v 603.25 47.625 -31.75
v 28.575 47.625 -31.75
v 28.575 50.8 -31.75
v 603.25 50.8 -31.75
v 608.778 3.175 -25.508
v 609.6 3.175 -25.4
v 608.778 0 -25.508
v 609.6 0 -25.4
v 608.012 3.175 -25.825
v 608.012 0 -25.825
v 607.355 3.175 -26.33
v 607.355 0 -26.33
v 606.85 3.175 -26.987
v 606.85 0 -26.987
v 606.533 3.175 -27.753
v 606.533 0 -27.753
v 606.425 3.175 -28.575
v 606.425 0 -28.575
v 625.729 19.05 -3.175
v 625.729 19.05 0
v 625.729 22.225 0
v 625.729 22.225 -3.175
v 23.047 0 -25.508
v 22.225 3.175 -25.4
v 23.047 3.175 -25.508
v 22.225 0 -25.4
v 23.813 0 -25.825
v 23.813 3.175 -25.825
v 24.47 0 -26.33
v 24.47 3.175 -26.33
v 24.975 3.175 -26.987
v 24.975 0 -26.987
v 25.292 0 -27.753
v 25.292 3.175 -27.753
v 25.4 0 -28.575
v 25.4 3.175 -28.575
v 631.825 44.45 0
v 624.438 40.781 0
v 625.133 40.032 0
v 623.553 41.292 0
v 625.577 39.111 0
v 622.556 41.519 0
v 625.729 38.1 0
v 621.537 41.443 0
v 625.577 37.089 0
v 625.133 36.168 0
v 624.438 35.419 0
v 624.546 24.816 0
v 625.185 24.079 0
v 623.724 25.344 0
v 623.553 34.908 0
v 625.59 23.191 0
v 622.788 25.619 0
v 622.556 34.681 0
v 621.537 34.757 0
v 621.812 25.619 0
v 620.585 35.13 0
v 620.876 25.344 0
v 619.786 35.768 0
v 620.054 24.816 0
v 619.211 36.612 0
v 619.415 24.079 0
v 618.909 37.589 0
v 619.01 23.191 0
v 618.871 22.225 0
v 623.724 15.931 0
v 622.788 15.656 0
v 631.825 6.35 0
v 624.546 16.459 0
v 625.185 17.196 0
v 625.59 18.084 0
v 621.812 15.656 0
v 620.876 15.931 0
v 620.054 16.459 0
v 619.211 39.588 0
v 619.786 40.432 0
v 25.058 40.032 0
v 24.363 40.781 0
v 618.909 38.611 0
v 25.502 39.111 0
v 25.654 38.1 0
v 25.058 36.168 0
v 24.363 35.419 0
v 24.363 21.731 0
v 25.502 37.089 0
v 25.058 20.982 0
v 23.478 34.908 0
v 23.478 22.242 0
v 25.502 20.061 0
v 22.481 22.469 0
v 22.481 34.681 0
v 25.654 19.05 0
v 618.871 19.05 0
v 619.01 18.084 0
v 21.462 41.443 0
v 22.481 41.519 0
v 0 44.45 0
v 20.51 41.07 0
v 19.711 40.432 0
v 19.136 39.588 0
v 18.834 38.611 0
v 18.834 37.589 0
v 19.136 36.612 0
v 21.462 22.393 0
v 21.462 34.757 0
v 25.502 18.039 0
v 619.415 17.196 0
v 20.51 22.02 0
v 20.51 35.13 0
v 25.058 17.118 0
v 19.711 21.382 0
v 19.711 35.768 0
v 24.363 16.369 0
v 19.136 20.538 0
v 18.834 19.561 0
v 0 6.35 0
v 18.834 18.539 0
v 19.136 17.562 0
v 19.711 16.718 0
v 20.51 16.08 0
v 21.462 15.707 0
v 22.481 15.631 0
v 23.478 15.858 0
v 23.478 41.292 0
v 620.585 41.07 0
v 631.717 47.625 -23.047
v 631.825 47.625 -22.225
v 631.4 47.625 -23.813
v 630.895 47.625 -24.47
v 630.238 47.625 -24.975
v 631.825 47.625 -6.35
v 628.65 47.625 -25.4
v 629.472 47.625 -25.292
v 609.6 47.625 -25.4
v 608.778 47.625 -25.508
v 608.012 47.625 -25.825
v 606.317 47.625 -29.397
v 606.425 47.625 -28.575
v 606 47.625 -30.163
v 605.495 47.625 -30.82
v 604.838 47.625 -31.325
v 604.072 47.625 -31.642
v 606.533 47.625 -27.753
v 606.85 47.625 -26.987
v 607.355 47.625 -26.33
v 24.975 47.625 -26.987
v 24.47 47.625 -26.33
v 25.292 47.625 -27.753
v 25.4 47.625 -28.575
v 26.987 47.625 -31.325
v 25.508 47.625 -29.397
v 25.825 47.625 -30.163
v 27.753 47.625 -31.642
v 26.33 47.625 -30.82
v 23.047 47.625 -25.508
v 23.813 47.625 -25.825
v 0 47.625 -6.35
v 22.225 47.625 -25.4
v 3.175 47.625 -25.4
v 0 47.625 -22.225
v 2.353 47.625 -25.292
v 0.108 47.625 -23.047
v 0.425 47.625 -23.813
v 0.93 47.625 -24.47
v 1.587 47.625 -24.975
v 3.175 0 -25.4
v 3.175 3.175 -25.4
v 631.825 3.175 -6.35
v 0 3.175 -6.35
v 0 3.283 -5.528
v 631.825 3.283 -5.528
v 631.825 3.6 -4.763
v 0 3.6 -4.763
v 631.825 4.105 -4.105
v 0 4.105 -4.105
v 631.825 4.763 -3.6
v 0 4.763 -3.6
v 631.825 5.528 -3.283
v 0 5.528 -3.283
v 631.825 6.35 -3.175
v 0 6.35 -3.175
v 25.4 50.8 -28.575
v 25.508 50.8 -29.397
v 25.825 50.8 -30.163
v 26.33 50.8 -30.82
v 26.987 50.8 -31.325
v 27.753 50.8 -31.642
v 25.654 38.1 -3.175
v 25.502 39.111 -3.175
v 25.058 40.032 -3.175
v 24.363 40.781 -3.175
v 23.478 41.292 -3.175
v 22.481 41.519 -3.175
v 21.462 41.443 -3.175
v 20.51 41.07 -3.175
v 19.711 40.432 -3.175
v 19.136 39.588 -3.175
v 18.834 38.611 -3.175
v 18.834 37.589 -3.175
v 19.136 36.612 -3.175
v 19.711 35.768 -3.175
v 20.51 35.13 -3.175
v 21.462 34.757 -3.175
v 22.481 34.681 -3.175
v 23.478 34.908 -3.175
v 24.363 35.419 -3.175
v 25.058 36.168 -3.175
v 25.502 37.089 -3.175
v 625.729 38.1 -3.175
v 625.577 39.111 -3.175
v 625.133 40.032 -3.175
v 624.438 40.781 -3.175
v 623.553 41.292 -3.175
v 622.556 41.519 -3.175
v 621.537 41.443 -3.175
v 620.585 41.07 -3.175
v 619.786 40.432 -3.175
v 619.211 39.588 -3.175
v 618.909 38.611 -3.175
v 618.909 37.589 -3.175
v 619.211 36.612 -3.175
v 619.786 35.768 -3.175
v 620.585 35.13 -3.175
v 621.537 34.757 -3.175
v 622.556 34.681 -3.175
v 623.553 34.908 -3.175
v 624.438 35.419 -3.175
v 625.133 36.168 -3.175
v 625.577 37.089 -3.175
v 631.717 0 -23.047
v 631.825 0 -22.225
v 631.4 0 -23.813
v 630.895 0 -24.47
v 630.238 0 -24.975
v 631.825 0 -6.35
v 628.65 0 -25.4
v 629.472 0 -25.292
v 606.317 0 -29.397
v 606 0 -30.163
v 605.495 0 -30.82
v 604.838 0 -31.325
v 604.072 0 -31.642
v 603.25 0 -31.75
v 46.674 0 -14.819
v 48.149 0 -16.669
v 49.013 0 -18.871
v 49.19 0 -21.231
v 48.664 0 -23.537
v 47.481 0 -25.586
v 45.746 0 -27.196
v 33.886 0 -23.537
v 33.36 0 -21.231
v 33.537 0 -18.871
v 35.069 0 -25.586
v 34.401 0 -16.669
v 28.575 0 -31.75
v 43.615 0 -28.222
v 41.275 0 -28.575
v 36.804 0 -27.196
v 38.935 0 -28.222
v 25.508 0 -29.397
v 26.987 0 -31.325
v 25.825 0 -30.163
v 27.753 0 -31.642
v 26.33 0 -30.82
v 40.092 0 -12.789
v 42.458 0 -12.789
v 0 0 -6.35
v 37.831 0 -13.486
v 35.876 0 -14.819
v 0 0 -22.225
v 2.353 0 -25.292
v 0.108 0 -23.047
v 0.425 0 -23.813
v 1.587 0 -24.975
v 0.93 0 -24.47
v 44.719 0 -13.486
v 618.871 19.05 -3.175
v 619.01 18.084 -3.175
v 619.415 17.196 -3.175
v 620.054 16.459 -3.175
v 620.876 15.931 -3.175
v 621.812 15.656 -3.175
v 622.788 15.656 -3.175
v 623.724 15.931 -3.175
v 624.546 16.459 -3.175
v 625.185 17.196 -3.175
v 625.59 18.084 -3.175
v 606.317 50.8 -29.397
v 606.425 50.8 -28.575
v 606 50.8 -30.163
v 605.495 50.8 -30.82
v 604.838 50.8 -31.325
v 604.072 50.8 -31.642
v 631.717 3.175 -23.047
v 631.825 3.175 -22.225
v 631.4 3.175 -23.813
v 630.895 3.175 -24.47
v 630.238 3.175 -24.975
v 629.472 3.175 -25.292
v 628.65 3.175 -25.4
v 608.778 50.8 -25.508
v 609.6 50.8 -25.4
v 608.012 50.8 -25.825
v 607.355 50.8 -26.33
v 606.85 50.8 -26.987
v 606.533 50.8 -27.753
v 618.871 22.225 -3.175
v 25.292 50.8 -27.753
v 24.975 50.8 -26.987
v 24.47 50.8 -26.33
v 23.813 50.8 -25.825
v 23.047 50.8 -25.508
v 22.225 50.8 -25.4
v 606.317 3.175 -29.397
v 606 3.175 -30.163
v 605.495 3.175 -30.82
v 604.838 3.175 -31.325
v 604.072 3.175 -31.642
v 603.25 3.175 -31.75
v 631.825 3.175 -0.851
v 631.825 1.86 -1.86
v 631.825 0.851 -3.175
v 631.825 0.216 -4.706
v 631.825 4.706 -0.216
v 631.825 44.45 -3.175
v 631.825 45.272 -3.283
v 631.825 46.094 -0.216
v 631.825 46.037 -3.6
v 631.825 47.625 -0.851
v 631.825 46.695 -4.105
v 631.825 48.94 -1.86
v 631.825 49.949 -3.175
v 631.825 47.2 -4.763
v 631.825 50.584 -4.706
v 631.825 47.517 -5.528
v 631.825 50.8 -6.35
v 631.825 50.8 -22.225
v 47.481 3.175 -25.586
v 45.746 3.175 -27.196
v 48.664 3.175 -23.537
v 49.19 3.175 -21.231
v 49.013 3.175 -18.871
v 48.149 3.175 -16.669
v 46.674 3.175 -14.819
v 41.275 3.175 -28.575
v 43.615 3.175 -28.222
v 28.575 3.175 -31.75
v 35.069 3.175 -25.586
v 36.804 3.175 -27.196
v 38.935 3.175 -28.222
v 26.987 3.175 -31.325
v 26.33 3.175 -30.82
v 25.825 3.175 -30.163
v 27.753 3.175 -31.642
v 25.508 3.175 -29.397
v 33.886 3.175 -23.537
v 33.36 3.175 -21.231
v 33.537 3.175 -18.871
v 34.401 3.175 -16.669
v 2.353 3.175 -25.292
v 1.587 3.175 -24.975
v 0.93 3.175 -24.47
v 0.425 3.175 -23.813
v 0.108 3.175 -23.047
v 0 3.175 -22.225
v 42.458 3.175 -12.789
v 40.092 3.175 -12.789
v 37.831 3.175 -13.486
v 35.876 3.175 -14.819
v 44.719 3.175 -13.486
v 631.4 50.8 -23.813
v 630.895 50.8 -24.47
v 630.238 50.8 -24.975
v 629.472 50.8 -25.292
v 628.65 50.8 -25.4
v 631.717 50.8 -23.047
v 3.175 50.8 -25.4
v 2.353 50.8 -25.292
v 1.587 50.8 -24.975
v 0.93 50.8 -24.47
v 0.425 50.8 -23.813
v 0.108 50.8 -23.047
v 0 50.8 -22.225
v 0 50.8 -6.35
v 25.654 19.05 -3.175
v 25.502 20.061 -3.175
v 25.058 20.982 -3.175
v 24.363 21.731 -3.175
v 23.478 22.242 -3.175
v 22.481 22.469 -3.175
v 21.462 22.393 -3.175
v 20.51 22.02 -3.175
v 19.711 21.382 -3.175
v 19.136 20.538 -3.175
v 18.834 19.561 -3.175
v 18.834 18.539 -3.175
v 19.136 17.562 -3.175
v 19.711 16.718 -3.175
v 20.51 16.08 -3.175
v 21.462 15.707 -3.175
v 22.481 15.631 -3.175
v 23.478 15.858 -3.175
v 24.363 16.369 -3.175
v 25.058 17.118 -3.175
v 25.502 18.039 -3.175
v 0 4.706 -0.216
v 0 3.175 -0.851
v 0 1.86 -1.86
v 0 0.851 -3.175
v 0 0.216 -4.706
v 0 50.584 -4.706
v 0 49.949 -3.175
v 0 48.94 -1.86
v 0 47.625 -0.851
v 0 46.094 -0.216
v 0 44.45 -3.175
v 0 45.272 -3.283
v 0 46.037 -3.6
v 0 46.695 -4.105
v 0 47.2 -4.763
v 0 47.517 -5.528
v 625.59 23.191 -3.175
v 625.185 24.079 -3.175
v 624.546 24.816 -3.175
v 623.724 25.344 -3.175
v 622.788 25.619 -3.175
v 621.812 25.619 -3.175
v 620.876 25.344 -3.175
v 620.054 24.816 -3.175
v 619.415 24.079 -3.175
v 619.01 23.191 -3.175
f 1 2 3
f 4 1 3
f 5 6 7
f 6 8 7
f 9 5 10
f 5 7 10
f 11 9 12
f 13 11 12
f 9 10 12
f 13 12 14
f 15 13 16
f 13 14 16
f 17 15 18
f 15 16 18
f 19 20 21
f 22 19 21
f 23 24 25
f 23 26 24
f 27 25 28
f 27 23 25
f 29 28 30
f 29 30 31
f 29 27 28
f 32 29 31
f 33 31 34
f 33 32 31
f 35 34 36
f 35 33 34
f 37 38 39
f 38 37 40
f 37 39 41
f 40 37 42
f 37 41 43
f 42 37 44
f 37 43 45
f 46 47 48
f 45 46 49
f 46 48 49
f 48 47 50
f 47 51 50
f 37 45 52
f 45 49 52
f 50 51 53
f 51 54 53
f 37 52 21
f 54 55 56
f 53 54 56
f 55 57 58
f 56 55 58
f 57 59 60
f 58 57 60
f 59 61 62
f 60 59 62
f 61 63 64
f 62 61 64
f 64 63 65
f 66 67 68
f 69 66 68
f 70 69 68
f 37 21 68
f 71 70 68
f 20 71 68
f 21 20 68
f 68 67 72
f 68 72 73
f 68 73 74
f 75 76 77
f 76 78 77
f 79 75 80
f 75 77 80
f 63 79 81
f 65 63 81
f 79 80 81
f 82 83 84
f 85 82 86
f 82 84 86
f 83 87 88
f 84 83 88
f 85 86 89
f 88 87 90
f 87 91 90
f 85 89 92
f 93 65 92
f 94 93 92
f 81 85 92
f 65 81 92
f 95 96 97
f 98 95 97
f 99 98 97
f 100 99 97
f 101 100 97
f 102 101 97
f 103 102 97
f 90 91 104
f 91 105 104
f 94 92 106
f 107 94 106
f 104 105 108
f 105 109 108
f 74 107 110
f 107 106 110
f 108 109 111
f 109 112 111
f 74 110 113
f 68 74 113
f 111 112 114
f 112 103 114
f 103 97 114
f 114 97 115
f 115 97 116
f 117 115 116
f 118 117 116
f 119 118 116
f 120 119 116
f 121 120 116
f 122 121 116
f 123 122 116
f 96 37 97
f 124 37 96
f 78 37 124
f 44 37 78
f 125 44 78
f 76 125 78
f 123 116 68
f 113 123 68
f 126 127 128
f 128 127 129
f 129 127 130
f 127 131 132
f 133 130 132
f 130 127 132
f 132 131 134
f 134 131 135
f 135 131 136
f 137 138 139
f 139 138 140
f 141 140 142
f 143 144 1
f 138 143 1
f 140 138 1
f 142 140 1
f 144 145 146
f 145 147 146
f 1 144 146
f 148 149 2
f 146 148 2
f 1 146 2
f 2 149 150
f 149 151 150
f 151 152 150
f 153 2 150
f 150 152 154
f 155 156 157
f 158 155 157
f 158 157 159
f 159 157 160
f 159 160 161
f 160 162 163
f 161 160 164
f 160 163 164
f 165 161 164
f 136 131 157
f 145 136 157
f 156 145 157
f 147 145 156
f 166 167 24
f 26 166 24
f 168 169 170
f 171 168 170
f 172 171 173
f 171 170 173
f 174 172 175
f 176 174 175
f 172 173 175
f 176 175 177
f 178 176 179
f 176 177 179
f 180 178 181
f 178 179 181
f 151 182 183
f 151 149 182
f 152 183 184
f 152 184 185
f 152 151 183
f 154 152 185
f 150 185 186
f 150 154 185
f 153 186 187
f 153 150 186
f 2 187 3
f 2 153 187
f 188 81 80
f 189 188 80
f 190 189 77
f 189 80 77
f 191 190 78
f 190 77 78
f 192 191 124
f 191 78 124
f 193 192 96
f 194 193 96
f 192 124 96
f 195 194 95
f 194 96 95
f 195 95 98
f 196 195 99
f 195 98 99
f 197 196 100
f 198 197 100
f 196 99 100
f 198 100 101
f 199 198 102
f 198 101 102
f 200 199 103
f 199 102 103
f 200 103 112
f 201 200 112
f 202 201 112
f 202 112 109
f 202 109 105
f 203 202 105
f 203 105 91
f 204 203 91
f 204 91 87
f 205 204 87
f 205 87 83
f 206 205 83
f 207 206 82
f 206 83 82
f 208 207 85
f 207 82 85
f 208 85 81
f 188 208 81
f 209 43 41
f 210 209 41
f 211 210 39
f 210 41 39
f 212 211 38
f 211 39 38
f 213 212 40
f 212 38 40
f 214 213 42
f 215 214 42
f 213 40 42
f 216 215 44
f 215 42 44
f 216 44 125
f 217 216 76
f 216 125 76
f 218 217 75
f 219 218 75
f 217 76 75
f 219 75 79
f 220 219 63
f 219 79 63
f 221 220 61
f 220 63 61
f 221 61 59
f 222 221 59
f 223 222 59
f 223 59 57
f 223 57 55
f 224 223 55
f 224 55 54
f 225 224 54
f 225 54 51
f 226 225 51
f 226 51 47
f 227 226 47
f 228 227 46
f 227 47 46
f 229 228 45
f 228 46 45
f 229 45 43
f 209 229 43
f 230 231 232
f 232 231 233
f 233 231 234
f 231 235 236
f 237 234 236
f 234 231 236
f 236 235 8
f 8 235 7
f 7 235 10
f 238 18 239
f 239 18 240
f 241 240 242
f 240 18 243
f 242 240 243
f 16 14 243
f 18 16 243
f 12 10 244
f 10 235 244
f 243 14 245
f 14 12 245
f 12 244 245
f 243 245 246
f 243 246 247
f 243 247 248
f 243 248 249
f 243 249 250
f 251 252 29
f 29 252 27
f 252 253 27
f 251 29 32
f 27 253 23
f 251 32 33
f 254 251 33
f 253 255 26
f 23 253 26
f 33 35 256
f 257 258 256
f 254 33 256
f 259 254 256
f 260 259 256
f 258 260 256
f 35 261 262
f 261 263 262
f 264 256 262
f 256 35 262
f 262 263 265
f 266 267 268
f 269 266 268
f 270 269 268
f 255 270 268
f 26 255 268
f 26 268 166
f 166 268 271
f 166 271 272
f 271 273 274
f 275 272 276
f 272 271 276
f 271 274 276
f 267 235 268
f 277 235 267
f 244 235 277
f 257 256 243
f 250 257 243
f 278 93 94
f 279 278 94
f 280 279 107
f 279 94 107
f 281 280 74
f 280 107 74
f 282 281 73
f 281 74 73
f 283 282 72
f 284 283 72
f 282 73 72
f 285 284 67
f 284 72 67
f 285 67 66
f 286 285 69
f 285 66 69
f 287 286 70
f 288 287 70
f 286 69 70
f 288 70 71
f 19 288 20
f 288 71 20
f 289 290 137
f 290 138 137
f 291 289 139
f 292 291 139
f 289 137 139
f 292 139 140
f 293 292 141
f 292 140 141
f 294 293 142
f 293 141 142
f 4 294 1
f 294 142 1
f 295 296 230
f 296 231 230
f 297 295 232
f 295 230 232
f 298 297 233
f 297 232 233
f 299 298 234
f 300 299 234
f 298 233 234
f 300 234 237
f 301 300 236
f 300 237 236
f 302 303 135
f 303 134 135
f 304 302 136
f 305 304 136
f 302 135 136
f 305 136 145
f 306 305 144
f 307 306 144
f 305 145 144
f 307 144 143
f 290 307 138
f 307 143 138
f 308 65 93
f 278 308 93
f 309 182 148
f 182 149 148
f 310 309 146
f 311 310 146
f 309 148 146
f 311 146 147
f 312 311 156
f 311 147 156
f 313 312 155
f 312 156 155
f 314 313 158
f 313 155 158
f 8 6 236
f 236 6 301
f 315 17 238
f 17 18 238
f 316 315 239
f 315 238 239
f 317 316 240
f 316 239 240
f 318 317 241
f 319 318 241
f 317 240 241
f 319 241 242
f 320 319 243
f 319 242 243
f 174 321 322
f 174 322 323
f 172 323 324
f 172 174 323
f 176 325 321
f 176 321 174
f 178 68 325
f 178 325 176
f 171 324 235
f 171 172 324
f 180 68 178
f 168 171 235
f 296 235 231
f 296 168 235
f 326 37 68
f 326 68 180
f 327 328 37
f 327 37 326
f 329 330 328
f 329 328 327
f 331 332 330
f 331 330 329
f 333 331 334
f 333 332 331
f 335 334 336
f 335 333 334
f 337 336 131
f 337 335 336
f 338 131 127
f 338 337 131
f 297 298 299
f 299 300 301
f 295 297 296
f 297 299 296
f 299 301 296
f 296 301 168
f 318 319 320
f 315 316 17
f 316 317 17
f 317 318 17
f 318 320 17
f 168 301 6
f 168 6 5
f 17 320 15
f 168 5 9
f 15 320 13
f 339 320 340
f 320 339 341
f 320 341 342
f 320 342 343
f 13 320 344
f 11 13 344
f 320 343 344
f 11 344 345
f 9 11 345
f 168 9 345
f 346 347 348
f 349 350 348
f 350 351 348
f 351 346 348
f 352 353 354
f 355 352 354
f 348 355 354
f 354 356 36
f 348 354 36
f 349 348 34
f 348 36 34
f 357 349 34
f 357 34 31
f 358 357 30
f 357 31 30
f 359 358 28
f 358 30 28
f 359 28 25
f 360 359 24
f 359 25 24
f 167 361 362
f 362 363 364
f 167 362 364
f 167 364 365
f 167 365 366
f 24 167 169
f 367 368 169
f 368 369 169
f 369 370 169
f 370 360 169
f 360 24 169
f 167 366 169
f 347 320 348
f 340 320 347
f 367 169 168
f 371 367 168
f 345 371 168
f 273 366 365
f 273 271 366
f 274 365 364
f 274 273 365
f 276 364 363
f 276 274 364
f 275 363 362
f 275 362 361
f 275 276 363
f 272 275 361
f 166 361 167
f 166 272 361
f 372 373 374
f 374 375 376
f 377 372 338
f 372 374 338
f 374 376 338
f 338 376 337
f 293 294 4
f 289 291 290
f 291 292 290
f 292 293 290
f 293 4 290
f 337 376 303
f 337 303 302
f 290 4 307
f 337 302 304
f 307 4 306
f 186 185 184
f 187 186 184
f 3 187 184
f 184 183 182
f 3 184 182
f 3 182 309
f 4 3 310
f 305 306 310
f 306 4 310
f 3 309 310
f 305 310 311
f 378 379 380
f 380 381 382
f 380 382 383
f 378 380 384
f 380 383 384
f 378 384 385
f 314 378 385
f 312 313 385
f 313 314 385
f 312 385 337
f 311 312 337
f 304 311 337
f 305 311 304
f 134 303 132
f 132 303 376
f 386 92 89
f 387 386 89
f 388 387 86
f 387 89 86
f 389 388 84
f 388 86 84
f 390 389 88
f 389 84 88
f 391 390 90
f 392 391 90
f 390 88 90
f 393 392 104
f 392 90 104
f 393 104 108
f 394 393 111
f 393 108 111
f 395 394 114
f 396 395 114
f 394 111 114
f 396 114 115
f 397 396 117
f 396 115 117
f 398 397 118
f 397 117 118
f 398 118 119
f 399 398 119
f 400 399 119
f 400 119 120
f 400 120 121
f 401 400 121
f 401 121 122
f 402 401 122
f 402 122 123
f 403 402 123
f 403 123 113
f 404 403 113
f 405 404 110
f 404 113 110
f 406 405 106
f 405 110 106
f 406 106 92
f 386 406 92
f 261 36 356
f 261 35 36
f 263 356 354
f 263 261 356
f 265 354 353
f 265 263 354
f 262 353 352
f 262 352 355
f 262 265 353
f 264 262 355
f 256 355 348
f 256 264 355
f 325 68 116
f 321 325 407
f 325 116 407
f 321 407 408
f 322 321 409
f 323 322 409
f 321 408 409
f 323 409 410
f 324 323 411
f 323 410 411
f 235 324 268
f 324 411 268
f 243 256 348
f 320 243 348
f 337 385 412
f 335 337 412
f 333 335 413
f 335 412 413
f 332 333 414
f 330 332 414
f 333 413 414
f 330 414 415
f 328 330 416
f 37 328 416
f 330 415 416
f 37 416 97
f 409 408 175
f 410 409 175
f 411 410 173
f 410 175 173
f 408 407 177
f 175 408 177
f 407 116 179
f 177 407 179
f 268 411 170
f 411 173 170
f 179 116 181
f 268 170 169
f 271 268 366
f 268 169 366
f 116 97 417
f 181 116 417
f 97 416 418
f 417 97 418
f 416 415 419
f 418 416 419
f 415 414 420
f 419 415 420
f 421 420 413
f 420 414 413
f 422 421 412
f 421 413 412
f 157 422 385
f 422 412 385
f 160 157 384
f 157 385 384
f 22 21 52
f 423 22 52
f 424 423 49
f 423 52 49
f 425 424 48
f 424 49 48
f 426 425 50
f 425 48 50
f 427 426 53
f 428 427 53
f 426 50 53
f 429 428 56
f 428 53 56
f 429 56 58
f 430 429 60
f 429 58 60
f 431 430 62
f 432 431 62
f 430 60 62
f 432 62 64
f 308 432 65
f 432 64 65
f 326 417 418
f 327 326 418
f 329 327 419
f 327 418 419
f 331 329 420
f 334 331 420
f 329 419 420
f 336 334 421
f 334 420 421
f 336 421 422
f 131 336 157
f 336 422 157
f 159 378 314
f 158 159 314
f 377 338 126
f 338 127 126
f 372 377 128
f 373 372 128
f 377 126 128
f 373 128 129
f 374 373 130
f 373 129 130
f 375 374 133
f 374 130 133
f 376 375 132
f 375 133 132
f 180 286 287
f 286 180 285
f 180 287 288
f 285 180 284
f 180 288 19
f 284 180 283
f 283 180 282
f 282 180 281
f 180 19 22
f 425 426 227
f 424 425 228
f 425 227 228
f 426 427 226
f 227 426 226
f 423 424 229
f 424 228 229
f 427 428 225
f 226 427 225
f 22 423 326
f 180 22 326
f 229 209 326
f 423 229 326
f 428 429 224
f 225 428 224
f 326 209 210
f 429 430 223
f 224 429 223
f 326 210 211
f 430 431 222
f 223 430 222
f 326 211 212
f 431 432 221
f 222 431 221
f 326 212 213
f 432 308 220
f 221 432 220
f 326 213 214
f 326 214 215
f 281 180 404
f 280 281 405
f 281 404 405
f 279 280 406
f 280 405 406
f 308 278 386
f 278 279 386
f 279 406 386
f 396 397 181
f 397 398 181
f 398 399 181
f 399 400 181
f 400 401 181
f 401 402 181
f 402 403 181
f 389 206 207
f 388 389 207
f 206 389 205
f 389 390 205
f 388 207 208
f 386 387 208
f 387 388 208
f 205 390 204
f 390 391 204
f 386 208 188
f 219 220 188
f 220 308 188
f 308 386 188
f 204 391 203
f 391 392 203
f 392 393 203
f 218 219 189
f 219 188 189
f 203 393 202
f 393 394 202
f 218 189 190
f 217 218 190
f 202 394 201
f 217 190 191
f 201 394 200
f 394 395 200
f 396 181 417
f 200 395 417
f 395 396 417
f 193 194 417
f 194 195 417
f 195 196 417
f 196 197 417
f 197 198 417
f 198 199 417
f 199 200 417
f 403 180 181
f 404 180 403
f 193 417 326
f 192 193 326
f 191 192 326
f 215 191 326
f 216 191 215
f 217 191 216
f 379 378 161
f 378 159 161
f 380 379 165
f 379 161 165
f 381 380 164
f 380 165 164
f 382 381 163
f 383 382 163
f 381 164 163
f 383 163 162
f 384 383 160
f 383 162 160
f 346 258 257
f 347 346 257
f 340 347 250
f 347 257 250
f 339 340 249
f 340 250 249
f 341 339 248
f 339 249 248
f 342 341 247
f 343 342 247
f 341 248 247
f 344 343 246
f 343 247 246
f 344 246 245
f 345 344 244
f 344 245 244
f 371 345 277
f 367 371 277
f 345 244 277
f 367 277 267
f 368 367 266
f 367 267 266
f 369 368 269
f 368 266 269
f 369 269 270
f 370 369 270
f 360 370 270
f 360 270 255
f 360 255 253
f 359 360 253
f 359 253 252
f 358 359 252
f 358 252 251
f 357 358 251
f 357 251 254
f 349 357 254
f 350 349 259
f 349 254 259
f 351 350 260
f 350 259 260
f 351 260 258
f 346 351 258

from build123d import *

# Parameters (mm, degrees)
BASE_FLANGE1_DEPTH = 631.825
SKETCH2_W          = 25.4
SKETCH2_H          = 6.35
CUT_EXTRUDE1_DEPTH = 50.8
SKETCH3_R          = 3.429
CUT_EXTRUDE2_DEPTH = 3.175
FILLET1_R          = 3.175
SKETCH4_R          = 7.9375
CUT_EXTRUDE3_DEPTH = 3.175


# Sheet-metal steps are written as plain solids
with BuildPart() as part:
    # Sketch1 → Base-Flange1 (new body)
    with BuildSketch(Plane(origin=(0, 0, 0), x_dir=(0, 0, -1), z_dir=(1, 0, 0))):
        with BuildLine():
            Line((31.75, 50.8), (6.35, 50.8))
            ThreePointArc((6.35, 50.8), (1.859871939, 48.940128061), (0, 44.45))
            Line((0, 44.45), (0, 6.35))
            ThreePointArc((0, 6.35), (1.859871939, 1.859871939), (6.35, 0))
            Line((6.35, 0), (31.75, 0))
            Line((31.75, 0), (31.75, 3.175))
            Line((31.75, 3.175), (6.35, 3.175))
            ThreePointArc((6.35, 3.175), (4.10493597, 4.10493597), (3.175, 6.35))
            Line((3.175, 6.35), (3.175, 44.45))
            ThreePointArc((3.175, 44.45), (4.10493597, 46.69506403), (6.35, 47.625))
            Line((6.35, 47.625), (31.75, 47.625))
            Line((31.75, 47.625), (31.75, 50.8))
        make_face()
    extrude(amount=BASE_FLANGE1_DEPTH)

    # Sketch2 → Cut-Extrude1 (cut)
    with BuildSketch(Plane(origin=(0, 50.8, 0), x_dir=(1, 0, 0), z_dir=(0, 1, 0))):
        with Locations((12.7, 28.575)):
            Rectangle(SKETCH2_W, SKETCH2_H)
        with Locations((619.125, 28.575)):
            Rectangle(SKETCH2_W, SKETCH2_H)
    extrude(amount=-CUT_EXTRUDE1_DEPTH, mode=Mode.SUBTRACT)

    # Sketch3 → Cut-Extrude2 (cut)
    with BuildSketch(Plane.XY):
        with Locations((22.225, 19.05)):
            Circle(SKETCH3_R)
        with Locations((22.225, 38.1)):
            Circle(SKETCH3_R)
        with Locations((622.3, 38.1)):
            Circle(SKETCH3_R)
        with BuildLine():
            Line((618.871, 22.225), (618.871, 19.05))
            ThreePointArc((618.871, 19.05), (622.3, 15.621), (625.729, 19.05))
            Line((625.729, 19.05), (625.729, 22.225))
            ThreePointArc((625.729, 22.225), (622.3, 25.654), (618.871, 22.225))
        make_face()
    extrude(amount=-CUT_EXTRUDE2_DEPTH, mode=Mode.SUBTRACT)

    # Fillet1
    fillet1_edges = [part.edges().sort_by_distance(p)[0] for p in [
        (0, 49.2125, -25.4),
        (25.4, 49.2125, -31.75),
        (0, 1.5875, -25.4),
        (25.4, 1.5875, -31.75),
        (606.425, 1.5875, -31.75),
        (606.425, 49.2125, -31.75),
        (631.825, 1.5875, -25.4),
        (631.825, 49.2125, -25.4),
        (606.425, 1.5875, -25.4),
        (606.425, 49.2125, -25.4),
        (25.4, 1.5875, -25.4),
        (25.4, 49.2125, -25.4),
    ]]
    fillet(fillet1_edges, radius=FILLET1_R - 0.0001)  # a hair under: the kernel refuses the full size

    # Sketch4 → Cut-Extrude3 (cut)
    with BuildSketch(Plane.XZ):
        with Locations(Location((41.275, -20.6375, 0), (0, 0, 270))):
            Circle(SKETCH4_R)
    extrude(amount=-CUT_EXTRUDE3_DEPTH, mode=Mode.SUBTRACT)


solid = part.part
